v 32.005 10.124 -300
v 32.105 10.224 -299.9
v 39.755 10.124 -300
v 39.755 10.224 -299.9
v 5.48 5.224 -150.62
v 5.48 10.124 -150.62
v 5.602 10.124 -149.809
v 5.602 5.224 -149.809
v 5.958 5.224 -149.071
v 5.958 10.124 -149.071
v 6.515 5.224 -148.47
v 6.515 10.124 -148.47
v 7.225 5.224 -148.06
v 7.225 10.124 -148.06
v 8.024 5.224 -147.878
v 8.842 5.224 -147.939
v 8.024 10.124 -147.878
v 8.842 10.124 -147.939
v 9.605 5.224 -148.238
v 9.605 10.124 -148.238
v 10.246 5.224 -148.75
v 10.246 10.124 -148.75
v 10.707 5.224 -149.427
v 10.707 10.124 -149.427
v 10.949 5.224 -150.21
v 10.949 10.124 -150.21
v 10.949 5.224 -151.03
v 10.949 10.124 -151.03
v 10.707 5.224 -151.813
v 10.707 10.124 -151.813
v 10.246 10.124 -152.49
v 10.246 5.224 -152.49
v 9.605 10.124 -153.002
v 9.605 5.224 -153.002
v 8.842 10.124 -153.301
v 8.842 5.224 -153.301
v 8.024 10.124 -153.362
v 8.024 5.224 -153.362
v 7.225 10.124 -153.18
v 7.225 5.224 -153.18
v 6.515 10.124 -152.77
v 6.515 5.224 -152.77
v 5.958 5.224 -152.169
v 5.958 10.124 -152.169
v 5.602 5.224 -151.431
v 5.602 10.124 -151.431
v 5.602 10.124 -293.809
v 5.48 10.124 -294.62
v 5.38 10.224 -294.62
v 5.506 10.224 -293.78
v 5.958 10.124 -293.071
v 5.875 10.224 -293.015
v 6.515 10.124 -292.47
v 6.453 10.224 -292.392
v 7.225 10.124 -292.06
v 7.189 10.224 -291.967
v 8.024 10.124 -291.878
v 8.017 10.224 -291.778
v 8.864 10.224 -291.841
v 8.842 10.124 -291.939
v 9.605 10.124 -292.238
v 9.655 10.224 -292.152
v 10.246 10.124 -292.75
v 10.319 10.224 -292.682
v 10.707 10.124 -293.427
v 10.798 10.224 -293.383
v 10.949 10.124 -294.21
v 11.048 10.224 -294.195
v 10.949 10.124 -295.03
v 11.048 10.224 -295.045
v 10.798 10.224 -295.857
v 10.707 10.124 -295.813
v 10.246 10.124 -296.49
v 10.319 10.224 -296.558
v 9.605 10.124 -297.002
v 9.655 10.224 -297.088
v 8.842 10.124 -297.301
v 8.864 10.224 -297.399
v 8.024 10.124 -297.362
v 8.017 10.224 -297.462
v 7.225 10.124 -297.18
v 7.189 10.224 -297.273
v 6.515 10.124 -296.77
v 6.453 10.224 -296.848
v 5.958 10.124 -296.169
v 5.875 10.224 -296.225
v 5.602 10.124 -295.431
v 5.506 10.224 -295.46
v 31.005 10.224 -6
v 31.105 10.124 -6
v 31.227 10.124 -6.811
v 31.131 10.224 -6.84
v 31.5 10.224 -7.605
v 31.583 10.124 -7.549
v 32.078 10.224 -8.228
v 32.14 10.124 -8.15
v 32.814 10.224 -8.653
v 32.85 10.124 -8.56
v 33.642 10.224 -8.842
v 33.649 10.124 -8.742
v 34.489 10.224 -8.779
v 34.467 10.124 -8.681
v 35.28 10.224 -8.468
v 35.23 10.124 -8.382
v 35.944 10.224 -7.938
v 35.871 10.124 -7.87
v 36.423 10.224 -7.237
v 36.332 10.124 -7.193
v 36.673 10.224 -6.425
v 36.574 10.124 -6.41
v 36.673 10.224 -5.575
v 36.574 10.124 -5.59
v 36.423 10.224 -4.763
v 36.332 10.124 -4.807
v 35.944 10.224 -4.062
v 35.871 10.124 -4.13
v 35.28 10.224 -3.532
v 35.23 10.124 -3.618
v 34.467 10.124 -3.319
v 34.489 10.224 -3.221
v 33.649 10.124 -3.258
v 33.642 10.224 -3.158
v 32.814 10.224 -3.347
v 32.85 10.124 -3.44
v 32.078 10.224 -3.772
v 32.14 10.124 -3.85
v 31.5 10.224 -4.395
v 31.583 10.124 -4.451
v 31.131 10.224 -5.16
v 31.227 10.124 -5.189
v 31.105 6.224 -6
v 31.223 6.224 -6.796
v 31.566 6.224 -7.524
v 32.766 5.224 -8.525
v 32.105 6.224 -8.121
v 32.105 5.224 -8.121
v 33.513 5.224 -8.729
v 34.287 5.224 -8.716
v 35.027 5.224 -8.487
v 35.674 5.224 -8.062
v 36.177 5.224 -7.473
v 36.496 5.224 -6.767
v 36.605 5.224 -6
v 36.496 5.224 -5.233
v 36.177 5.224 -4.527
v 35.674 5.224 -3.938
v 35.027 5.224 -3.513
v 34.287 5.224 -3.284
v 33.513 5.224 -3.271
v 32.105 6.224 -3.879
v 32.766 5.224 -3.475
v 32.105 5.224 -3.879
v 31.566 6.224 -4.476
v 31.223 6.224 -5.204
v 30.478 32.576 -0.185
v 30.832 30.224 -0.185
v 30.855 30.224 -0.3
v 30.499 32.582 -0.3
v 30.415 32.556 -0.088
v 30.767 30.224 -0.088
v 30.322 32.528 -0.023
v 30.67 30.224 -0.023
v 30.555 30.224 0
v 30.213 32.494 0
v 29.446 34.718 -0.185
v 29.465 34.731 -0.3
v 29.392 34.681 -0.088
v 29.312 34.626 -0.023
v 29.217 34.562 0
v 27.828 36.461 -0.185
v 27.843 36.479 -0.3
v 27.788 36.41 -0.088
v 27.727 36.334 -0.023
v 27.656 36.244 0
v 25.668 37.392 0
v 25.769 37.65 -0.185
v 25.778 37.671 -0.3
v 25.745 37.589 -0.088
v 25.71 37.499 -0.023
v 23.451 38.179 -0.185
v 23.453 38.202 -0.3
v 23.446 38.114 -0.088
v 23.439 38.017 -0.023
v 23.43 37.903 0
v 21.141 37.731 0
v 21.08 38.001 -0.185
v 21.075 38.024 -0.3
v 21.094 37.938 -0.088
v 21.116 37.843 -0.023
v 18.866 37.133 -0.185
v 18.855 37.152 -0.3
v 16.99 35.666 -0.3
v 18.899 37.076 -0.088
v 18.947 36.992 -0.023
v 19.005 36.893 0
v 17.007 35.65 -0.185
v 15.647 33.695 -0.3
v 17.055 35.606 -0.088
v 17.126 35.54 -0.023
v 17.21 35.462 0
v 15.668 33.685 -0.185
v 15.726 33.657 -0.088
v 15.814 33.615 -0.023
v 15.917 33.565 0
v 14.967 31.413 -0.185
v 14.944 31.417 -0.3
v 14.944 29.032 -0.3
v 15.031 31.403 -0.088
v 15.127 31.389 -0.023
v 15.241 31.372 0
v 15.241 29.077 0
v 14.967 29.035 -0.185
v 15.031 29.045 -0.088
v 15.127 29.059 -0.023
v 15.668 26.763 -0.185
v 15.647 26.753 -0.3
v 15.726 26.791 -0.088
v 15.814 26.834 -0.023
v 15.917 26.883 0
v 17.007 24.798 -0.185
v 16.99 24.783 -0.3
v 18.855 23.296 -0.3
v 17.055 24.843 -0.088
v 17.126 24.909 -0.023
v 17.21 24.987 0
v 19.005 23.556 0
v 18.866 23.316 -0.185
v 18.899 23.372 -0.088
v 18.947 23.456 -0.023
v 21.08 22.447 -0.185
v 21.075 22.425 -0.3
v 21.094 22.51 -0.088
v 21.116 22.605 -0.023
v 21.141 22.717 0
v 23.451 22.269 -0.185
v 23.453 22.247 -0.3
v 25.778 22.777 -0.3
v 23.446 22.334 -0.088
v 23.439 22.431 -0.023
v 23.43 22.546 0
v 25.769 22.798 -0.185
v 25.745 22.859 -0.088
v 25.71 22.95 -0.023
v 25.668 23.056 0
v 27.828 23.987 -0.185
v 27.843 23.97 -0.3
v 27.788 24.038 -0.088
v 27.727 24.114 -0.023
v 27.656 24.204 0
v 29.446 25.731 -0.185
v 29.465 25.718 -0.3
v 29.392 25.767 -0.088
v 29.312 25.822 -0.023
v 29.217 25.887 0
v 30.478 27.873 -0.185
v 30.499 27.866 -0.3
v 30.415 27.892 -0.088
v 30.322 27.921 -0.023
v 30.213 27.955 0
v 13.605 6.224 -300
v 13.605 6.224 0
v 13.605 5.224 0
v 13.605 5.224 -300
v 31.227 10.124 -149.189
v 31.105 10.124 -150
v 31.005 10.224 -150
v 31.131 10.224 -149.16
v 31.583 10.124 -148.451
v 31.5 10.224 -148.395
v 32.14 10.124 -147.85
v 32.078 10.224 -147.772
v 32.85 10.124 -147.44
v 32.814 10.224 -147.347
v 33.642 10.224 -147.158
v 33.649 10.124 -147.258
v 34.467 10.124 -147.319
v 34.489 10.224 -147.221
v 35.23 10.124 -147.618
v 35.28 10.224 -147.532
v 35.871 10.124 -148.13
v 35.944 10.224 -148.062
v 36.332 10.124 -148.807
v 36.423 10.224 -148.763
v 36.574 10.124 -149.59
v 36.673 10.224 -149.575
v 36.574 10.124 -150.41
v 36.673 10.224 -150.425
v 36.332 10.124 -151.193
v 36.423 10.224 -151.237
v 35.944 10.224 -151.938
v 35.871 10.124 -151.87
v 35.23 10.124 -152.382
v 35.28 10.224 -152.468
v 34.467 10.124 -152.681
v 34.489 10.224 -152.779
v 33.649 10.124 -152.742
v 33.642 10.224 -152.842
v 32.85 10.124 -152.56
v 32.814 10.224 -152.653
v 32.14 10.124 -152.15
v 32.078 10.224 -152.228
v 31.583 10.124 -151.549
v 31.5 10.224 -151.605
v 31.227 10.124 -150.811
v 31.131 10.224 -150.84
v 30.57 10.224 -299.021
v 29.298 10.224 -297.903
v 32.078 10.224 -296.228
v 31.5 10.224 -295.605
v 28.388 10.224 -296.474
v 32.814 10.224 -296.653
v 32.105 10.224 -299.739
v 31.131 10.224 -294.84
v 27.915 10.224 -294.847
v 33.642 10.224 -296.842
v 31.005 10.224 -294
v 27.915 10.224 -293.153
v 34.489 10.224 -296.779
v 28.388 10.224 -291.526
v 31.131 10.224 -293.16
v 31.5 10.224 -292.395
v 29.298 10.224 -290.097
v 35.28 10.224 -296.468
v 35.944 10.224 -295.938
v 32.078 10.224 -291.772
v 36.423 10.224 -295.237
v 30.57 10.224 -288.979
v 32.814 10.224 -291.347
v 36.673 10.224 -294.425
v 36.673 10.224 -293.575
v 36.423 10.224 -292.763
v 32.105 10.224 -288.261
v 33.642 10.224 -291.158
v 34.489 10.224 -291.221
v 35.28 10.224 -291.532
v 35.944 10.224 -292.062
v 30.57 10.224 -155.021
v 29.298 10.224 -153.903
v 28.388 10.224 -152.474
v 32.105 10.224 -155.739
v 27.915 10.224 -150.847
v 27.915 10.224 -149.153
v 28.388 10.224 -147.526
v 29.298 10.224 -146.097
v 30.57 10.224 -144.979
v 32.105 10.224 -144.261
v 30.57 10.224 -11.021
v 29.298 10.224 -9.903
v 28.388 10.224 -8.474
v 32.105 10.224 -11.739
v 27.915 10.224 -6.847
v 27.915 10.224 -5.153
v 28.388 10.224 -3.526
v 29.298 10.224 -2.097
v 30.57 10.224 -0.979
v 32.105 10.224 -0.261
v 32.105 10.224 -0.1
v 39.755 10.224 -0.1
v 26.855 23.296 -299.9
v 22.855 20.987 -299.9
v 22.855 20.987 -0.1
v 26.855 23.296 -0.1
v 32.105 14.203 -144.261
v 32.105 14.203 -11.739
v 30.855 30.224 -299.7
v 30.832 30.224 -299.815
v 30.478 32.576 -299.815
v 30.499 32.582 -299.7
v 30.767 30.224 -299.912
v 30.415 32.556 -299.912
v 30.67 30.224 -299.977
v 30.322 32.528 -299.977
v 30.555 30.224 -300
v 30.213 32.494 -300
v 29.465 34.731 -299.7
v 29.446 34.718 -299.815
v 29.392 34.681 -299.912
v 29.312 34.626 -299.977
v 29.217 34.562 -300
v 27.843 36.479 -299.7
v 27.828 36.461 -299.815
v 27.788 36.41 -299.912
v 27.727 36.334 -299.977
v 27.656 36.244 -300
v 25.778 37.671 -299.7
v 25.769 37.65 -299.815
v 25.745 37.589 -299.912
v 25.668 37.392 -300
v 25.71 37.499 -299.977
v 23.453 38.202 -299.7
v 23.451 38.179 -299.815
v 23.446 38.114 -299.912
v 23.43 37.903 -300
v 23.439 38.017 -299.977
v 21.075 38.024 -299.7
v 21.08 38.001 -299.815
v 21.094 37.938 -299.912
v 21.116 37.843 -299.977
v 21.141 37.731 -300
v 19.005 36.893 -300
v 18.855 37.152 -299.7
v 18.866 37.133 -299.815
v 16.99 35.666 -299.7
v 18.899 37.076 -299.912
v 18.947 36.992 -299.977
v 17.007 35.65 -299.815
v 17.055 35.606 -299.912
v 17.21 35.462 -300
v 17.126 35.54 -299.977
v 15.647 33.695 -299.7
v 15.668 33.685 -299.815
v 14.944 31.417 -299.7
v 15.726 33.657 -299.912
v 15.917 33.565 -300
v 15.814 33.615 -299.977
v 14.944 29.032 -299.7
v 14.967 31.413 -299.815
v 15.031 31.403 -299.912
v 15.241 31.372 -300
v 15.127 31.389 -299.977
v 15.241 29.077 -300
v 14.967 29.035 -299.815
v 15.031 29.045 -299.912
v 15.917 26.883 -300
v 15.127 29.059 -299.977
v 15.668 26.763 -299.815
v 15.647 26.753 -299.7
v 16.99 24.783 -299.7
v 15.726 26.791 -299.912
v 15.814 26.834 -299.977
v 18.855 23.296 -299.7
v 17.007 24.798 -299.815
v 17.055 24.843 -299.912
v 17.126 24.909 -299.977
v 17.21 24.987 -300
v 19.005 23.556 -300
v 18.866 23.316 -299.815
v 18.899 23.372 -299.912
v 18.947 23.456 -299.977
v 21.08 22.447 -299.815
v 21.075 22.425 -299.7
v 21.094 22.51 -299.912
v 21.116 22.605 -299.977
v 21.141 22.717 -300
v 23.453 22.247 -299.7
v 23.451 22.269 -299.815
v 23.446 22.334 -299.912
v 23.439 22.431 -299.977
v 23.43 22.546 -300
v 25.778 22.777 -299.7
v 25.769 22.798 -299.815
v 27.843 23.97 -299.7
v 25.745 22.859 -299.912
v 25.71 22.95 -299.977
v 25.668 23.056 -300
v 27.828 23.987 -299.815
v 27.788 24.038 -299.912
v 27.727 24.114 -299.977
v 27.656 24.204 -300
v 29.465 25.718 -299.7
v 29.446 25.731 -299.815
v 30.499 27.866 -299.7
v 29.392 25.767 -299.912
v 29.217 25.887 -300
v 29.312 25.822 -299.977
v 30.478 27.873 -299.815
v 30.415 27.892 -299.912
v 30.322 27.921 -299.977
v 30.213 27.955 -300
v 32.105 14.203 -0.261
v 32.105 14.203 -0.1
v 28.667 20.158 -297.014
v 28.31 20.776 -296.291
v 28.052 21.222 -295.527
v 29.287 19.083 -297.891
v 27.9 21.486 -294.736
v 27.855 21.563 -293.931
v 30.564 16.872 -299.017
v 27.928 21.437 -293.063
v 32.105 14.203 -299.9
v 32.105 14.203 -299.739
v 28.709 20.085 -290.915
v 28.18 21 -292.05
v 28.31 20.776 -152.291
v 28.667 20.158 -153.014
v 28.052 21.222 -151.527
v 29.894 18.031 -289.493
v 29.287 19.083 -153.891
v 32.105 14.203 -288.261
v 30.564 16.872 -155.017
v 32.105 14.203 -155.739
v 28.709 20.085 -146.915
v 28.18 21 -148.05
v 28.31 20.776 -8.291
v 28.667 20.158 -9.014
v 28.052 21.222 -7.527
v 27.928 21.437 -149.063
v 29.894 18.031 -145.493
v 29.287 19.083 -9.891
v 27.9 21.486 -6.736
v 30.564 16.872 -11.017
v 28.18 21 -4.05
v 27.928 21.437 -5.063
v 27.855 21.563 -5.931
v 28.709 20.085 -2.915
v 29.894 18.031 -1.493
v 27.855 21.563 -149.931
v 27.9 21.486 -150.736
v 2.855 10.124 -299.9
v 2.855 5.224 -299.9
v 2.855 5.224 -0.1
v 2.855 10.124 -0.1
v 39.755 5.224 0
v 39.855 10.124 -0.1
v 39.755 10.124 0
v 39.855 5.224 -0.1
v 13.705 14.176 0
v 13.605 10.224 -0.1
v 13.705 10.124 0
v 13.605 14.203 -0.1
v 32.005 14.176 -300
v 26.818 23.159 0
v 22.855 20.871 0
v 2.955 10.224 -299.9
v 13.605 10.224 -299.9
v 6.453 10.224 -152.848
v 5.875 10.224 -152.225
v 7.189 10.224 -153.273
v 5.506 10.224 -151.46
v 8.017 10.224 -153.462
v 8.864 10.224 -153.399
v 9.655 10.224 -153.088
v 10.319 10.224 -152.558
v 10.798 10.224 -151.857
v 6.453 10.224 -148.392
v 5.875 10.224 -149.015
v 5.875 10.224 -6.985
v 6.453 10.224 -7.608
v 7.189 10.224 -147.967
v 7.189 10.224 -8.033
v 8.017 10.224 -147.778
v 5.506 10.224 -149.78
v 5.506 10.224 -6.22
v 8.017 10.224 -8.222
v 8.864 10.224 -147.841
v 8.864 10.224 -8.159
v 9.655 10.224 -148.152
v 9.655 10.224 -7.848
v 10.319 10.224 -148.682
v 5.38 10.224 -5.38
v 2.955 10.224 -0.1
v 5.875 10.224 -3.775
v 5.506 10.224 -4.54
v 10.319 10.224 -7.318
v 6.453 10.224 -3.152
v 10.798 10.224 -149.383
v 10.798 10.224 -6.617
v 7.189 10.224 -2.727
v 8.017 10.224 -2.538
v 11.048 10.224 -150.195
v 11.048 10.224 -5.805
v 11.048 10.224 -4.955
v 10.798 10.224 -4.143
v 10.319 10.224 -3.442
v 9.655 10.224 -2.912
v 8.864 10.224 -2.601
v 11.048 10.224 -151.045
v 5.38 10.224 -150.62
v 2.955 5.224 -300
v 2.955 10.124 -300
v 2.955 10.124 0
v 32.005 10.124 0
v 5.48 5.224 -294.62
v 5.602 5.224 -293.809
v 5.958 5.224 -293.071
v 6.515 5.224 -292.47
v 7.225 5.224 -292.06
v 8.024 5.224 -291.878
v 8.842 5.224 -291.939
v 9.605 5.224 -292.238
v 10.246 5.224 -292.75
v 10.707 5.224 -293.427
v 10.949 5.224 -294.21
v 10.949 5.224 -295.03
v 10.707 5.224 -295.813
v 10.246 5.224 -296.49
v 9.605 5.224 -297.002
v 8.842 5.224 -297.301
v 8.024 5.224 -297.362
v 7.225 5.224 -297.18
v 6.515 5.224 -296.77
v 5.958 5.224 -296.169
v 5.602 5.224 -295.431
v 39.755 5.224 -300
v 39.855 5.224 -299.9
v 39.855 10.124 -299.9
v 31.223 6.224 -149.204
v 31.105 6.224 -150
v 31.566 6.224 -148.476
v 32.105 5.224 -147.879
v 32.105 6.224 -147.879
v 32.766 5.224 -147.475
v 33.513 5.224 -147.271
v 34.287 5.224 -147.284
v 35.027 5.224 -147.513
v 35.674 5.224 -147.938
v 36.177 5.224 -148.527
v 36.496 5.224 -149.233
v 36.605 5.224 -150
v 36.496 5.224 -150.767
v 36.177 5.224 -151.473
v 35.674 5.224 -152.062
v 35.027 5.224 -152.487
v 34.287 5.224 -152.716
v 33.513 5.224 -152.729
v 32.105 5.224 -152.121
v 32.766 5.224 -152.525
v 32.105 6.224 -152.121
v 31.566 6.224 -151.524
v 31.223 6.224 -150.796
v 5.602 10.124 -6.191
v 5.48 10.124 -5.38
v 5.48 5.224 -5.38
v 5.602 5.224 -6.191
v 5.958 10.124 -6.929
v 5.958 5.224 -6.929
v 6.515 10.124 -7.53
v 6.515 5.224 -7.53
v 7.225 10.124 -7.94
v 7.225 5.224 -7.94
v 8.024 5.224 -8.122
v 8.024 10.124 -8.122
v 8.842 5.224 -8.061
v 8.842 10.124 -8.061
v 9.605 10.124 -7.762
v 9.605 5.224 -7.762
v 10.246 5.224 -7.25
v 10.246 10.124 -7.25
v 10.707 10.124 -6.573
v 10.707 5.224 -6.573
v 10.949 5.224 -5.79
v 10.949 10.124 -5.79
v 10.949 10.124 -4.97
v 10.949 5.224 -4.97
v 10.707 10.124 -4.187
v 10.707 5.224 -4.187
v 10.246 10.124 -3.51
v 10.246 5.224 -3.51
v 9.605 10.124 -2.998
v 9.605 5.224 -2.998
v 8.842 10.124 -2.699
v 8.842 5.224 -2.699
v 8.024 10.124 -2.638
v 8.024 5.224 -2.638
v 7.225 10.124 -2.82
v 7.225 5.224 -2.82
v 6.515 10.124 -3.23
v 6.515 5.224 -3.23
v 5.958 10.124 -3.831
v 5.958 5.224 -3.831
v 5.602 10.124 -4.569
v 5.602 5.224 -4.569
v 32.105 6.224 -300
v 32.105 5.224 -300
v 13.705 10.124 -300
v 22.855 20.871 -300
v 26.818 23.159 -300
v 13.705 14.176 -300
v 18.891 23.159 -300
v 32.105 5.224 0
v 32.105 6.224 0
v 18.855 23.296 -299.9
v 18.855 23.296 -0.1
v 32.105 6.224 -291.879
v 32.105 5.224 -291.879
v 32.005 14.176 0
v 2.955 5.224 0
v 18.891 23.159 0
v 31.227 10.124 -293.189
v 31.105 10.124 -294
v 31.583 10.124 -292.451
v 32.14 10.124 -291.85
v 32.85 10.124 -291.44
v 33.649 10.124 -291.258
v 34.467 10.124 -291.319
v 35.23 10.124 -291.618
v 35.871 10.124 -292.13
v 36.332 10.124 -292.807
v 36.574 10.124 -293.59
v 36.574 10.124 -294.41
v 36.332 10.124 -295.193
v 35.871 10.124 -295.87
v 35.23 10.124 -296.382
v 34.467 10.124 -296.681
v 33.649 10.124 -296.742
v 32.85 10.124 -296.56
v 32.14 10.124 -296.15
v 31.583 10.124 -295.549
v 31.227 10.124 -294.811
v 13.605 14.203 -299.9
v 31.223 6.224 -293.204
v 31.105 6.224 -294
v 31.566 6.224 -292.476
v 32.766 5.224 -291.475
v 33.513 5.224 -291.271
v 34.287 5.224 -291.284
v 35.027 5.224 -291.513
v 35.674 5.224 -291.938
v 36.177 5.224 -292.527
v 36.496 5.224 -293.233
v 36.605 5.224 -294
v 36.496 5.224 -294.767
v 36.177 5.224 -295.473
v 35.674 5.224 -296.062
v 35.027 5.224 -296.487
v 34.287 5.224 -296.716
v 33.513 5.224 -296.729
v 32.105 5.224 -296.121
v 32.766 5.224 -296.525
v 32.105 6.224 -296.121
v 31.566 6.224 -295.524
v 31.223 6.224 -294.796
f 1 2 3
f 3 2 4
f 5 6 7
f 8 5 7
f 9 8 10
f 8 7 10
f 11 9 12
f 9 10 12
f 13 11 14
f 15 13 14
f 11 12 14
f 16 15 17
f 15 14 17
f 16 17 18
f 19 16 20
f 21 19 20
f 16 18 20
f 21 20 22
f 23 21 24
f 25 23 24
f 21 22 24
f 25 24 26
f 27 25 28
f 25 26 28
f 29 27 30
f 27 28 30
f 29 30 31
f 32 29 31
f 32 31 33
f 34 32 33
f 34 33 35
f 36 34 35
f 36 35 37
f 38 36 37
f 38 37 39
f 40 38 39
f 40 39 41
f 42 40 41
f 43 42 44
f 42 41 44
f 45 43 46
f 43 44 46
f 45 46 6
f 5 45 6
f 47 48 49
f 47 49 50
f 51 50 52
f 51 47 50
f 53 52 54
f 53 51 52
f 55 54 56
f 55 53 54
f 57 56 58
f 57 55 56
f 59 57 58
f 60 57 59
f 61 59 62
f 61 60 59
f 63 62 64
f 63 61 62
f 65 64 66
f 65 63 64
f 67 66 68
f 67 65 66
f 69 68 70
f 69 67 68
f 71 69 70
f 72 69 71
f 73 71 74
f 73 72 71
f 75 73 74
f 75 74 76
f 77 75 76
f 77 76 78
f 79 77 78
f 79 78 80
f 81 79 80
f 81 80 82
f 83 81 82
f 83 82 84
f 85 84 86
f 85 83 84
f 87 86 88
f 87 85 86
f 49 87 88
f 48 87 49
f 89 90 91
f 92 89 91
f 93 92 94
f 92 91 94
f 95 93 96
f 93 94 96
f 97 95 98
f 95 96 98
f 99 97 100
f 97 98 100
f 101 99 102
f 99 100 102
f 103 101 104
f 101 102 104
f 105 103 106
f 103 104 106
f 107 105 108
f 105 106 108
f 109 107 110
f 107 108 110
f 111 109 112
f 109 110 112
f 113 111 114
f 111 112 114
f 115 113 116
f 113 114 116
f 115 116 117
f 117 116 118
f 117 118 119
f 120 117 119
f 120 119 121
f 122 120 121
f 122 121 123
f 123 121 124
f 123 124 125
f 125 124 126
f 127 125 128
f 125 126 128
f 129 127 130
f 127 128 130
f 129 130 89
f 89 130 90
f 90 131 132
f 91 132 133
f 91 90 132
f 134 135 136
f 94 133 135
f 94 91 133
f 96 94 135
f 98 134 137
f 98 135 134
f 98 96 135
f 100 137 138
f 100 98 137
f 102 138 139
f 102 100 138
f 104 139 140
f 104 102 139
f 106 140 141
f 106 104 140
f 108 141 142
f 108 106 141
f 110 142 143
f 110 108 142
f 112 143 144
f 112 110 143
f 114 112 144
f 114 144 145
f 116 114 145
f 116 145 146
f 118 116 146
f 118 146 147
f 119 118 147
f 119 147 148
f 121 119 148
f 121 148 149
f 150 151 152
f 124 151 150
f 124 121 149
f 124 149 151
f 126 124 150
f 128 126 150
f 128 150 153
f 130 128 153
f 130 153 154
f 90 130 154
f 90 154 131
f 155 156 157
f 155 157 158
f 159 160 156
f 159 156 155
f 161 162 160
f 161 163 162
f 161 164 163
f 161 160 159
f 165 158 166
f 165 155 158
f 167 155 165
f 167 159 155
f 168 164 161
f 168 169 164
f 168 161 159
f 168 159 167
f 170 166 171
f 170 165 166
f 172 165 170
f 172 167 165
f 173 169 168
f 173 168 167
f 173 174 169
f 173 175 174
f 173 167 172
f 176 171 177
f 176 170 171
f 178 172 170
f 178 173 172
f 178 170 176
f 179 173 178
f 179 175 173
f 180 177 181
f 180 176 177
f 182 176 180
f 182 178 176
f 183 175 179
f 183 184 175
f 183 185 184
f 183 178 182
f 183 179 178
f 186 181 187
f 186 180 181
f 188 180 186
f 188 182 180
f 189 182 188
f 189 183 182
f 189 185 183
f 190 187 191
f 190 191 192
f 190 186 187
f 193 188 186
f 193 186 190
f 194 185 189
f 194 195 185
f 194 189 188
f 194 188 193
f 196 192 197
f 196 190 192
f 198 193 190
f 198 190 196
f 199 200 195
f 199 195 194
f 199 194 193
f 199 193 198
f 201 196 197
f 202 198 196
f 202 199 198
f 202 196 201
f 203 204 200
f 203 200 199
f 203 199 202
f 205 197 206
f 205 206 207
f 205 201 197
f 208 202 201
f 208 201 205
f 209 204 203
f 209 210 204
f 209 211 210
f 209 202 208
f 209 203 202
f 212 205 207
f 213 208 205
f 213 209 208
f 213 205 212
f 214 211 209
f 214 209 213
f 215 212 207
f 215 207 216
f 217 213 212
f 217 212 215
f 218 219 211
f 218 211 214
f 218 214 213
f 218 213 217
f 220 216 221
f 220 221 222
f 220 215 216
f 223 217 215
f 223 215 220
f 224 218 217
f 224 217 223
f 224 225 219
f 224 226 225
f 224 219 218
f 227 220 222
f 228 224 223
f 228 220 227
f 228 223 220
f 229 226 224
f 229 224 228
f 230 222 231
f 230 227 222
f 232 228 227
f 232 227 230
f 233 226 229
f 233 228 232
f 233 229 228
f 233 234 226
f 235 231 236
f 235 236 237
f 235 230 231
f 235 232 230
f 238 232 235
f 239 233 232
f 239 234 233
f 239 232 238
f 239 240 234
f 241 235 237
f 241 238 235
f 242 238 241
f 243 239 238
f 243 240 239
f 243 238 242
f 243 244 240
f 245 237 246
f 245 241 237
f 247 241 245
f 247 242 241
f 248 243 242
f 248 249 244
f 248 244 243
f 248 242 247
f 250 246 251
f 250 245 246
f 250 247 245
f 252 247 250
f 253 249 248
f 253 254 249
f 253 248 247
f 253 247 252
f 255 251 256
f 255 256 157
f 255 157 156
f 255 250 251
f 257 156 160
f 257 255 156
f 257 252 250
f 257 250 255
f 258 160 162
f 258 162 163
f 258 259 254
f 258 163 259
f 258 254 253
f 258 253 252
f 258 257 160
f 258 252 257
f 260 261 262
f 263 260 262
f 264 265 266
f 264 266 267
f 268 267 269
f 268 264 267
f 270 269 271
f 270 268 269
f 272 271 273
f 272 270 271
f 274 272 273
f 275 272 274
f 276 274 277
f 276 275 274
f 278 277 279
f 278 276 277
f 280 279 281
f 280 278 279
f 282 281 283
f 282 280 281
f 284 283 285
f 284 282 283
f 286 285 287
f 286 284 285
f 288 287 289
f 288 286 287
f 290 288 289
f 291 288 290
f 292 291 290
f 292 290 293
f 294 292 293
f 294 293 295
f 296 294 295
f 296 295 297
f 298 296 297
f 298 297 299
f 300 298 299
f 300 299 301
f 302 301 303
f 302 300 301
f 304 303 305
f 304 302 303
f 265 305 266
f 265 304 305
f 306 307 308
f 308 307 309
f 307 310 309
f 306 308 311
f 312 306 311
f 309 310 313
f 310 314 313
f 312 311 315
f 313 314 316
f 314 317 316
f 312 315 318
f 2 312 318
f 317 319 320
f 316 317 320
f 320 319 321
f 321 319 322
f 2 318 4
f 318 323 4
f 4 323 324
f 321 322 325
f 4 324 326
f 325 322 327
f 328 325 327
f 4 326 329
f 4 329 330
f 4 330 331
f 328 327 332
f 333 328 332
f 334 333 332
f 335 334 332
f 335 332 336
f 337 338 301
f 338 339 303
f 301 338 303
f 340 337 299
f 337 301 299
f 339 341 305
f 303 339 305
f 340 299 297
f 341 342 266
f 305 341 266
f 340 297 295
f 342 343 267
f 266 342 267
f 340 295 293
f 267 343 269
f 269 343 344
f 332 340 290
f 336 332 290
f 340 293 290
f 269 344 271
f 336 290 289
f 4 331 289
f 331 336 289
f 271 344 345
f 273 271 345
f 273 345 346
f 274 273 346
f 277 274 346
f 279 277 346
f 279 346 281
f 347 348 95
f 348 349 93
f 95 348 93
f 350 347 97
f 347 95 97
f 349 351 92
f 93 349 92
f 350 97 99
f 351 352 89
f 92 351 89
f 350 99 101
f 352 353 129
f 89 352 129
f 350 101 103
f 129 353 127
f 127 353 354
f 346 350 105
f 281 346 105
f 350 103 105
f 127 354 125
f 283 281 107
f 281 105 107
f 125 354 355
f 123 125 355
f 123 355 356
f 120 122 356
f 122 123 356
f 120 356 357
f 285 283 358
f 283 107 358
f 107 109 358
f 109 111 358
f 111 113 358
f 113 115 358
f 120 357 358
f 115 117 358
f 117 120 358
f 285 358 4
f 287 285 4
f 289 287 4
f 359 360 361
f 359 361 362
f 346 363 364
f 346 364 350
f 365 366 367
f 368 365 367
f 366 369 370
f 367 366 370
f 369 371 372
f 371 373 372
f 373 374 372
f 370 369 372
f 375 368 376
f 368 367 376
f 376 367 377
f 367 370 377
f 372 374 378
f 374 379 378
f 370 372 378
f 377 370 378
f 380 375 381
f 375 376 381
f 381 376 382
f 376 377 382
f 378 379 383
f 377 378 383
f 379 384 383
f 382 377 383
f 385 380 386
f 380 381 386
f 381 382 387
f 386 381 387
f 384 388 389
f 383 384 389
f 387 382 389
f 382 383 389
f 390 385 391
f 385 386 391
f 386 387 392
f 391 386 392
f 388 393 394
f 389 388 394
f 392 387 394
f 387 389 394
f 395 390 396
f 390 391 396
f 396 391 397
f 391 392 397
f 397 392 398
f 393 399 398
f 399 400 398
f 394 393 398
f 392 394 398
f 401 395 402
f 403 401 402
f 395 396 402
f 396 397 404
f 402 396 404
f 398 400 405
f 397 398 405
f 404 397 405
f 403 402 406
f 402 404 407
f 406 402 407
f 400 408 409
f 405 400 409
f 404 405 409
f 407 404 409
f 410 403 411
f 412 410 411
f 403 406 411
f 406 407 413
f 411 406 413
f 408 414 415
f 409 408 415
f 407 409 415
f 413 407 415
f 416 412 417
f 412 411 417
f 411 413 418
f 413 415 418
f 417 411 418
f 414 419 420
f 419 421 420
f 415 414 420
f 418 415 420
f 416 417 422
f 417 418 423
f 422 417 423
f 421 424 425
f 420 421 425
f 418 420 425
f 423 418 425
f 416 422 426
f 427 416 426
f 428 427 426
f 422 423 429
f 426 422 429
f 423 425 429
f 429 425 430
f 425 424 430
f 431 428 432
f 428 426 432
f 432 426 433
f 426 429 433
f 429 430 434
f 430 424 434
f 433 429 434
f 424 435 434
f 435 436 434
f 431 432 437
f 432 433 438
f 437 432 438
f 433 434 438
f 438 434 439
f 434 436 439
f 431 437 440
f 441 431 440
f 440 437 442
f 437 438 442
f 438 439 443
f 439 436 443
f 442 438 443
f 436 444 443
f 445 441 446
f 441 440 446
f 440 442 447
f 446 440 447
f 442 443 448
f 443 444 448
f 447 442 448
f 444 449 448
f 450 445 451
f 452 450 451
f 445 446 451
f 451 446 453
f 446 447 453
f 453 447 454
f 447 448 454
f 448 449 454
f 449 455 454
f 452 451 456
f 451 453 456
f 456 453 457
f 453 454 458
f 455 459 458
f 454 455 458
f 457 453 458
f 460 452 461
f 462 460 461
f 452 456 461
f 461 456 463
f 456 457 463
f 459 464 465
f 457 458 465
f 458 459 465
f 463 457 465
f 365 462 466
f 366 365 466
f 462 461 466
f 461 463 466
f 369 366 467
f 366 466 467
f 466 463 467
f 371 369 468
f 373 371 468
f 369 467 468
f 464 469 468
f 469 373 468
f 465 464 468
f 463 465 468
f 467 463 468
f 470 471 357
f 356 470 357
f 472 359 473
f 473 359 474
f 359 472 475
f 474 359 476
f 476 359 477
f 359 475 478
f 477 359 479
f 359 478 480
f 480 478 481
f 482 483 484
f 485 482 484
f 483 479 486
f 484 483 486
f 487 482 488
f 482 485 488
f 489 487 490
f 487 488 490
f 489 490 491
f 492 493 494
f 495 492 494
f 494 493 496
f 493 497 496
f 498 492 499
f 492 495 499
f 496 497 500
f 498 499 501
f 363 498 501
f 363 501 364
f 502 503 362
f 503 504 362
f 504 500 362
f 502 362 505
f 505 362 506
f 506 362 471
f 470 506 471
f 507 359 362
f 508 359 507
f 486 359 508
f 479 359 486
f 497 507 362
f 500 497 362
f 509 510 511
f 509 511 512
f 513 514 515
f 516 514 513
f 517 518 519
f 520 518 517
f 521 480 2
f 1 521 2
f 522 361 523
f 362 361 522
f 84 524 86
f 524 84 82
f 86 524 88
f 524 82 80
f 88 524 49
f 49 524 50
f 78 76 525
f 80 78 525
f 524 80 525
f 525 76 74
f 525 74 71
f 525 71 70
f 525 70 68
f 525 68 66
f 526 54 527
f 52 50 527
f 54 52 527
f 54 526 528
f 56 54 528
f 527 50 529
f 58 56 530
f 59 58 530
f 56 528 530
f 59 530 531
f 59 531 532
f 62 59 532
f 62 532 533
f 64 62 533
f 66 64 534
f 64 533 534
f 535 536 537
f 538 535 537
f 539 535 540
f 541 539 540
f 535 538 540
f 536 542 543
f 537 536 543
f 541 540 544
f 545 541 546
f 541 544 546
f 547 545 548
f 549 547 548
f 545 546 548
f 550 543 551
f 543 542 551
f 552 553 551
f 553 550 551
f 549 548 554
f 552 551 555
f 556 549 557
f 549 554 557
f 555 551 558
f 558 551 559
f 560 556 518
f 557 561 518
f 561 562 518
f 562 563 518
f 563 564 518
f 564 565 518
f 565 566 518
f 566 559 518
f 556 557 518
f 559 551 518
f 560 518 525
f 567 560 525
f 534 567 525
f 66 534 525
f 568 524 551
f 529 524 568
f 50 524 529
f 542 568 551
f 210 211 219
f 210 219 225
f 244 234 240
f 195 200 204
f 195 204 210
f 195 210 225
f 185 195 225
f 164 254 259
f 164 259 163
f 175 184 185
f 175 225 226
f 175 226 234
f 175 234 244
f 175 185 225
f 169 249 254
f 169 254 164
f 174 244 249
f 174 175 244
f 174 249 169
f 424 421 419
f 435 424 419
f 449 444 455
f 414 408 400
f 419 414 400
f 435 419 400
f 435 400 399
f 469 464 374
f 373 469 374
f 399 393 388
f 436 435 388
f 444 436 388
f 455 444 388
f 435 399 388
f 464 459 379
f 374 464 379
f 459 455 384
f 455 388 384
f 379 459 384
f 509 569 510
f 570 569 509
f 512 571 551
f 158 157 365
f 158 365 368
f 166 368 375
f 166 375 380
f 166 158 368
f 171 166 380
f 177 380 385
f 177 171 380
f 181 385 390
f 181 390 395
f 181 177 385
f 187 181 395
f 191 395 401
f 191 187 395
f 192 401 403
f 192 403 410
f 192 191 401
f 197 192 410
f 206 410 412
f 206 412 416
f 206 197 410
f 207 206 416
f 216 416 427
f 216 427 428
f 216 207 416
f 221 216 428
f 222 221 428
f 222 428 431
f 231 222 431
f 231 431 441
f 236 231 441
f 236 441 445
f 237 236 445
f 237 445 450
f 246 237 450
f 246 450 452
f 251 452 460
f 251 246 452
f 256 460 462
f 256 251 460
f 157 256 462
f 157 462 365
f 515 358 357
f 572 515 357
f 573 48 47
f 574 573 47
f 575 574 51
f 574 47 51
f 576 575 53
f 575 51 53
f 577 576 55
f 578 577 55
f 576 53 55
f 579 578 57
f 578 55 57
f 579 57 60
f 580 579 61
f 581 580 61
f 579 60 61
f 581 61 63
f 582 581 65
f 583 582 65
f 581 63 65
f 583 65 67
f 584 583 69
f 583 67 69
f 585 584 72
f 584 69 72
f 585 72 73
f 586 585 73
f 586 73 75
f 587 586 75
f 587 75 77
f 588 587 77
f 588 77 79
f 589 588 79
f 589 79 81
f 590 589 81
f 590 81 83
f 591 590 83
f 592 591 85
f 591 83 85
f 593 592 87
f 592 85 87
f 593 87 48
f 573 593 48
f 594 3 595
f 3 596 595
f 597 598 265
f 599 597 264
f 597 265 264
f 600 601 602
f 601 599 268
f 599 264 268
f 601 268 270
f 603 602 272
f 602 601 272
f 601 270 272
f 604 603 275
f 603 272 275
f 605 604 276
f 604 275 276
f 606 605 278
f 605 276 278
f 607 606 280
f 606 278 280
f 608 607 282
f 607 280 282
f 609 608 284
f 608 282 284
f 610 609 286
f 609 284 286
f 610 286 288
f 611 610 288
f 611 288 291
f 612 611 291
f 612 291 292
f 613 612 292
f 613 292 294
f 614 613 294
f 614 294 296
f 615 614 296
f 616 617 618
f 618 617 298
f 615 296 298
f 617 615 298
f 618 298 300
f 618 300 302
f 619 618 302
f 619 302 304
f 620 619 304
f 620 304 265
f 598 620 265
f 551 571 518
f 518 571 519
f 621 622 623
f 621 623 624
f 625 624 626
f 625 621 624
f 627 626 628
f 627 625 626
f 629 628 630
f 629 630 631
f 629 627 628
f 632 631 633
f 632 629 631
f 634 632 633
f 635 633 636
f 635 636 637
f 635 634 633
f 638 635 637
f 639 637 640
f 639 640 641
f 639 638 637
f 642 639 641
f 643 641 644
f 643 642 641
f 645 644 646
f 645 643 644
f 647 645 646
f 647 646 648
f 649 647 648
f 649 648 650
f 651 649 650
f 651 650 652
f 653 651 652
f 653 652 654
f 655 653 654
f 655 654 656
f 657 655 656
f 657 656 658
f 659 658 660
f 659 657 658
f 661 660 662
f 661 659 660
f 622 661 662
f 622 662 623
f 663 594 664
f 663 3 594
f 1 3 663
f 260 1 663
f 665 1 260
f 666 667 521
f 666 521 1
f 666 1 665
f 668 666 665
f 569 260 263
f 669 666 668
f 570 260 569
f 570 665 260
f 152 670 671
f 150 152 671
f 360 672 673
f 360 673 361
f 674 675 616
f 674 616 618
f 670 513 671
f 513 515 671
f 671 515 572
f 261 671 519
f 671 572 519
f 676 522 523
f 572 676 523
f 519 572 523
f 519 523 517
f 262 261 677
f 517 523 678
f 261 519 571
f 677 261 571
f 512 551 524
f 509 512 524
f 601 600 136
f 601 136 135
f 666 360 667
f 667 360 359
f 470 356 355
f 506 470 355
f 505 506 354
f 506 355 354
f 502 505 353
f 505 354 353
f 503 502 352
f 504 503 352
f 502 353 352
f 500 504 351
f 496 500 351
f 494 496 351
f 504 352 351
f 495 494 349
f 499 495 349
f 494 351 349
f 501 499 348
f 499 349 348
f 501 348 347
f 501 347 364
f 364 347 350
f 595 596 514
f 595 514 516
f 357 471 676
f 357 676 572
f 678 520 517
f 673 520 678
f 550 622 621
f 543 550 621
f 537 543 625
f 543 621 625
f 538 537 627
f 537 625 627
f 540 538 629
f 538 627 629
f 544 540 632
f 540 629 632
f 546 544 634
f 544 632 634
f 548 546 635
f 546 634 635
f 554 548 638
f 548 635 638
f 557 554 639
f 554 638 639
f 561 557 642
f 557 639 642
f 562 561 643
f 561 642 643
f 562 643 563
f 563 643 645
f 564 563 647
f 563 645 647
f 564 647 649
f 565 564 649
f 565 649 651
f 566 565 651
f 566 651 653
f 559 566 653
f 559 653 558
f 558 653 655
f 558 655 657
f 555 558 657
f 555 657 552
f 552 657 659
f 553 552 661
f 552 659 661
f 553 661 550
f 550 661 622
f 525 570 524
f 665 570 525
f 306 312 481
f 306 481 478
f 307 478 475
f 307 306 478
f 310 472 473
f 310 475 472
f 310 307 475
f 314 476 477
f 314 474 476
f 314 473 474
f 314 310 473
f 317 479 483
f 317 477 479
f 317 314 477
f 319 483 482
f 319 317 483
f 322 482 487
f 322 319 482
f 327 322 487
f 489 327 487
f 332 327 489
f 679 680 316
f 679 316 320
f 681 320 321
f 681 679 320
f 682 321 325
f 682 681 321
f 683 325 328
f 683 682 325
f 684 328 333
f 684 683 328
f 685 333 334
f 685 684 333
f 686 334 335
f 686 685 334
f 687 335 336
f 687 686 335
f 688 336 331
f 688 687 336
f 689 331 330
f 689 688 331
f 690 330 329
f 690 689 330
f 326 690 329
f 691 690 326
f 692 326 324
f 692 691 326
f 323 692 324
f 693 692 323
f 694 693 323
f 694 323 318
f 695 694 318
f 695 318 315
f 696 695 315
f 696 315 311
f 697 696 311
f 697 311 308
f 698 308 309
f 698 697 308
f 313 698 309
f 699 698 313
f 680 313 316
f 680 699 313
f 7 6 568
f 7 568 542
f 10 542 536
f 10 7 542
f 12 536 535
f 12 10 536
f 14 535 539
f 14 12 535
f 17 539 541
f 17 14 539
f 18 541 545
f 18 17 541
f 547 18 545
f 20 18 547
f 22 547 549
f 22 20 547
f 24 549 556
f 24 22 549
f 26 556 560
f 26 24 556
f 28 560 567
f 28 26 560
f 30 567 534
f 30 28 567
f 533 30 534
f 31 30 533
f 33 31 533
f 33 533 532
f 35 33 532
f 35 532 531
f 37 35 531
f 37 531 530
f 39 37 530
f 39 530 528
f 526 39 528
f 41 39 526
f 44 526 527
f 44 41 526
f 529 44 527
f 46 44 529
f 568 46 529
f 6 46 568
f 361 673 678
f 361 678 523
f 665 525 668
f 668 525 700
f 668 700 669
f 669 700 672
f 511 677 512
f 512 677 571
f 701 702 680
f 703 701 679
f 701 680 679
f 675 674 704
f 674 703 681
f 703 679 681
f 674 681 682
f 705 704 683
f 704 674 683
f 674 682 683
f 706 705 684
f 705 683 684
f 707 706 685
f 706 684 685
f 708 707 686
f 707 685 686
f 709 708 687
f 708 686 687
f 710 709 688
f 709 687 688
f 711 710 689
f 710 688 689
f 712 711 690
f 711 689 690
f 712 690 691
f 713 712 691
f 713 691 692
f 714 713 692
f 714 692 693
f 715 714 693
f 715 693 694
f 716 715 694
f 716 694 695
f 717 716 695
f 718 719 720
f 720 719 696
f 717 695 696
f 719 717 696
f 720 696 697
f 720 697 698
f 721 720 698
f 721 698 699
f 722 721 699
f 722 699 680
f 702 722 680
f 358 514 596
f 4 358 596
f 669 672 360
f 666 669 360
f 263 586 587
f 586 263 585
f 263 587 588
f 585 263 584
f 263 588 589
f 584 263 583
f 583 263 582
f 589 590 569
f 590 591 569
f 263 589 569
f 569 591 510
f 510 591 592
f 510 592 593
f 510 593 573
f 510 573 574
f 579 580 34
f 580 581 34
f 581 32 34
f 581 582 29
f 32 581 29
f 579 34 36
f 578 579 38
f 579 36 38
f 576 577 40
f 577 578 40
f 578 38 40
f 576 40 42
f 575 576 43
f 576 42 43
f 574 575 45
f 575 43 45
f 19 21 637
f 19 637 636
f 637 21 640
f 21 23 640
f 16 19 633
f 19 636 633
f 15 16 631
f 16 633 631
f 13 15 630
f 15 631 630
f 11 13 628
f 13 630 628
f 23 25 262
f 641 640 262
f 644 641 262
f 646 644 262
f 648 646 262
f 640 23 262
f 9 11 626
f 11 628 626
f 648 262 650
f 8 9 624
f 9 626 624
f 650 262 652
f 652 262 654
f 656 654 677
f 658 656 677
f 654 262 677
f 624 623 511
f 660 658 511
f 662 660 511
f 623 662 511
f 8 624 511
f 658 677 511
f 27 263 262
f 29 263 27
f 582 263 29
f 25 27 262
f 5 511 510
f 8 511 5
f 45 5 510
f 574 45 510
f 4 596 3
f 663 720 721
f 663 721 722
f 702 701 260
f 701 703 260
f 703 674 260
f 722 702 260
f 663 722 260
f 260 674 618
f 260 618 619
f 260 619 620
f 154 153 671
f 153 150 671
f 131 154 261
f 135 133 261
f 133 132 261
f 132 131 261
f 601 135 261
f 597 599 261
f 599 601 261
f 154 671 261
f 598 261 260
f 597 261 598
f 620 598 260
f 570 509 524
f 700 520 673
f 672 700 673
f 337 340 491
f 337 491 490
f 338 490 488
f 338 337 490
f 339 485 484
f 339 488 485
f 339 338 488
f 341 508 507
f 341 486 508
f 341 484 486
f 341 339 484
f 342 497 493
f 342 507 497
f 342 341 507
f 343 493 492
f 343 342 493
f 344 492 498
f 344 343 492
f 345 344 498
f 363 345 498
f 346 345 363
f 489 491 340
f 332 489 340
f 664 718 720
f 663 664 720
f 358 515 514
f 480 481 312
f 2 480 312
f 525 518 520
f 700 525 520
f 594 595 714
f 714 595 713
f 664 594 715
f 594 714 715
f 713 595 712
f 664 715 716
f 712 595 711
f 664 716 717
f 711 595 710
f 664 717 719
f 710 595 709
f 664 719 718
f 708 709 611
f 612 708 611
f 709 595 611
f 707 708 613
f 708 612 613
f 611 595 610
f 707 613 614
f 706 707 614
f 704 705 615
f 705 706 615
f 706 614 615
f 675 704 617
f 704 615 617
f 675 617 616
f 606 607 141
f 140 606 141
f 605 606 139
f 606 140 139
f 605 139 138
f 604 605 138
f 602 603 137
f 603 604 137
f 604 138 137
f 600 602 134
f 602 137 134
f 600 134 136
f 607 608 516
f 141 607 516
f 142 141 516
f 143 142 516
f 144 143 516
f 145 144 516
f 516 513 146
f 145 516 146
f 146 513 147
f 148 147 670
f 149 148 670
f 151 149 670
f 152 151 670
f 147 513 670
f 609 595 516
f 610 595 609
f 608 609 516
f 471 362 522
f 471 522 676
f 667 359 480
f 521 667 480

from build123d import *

# Parameters (mm, degrees)
SKETCH1_R           = 8
BOSS_EXTRUDE1_DEPTH = 300
BOSS_EXTRUDE3_DEPTH = 300
FILLET1_R           = 0.3
SKETCH2_R           = 6
CUT_EXTRUDE1_DEPTH  = 12
SKETCH5_R           = 2.75
CUT_EXTRUDE2_DEPTH  = 5
SKETCH9_R           = 2.75
CUT_EXTRUDE3_DEPTH  = 5
LPATTERN1_COUNT     = 2
LPATTERN1_PITCH     = 144
LPATTERN2_COUNT     = 2
LPATTERN2_PITCH     = 144
CHAMFER1_SIZE       = 0.1


with BuildPart() as part:
    # Sketch1 → Boss-Extrude1 (new body)
    with BuildSketch(Plane.XY):
        with Locations((22.854793834, 30.224227114)):
            Circle(SKETCH1_R)
    extrude(amount=-BOSS_EXTRUDE1_DEPTH)

    # Fillet1
    fillet1_edges = [part.edges().sort_by_distance(p)[0] for p in [
        (14.854793834, 30.224227114, -300),
        (14.854793834, 30.224227114, 0),
    ]]
    fillet(fillet1_edges, radius=FILLET1_R)


with BuildPart() as body_2:
    # Sketch1<5> → Boss-Extrude3 (new body)
    with BuildSketch(Plane.XY):
        Polygon((2.854793834, 5.224227114), (2.854793834, 10.224227114), (13.604793834, 10.224227114), (13.604793834, 14.202757144), (18.854793834, 23.296023883), (22.854793834, 20.986622807), (26.854793834, 23.296023883), (32.104793834, 14.202757144), (32.104793834, 10.224227114), (39.854793834, 10.224227114), (39.854793834, 5.224227114), (32.104793834, 5.224227114), (32.104793834, 6.224227114), (13.604793834, 6.224227114), (13.604793834, 5.224227114), align=None)
    extrude(amount=-BOSS_EXTRUDE3_DEPTH)

    # Sketch2 → Cut-Extrude1 (cut)
    with BuildSketch(Plane(origin=(0, 10.224227114, 0), x_dir=(1, 0, 0), z_dir=(0, 1, 0))):
        with Locations((33.854793834, 294)):
            Circle(SKETCH2_R)
    cut_extrude1 = extrude(amount=CUT_EXTRUDE1_DEPTH, mode=Mode.SUBTRACT)

    # Sketch5 → Cut-Extrude2 (cut)
    with BuildSketch(Plane(origin=(0, 10.224227114, 0), x_dir=(1, 0, 0), z_dir=(0, 1, 0))):
        with Locations((33.854793834, 294)):
            Circle(SKETCH5_R)
    cut_extrude2 = extrude(amount=-CUT_EXTRUDE2_DEPTH, mode=Mode.SUBTRACT)

    # Mirror3: Cut-Extrude1, Cut-Extrude2 across plane
    add(cut_extrude1.mirror(Plane.XY.offset(-150)), mode=Mode.SUBTRACT)
    add(cut_extrude2.mirror(Plane.XY.offset(-150)), mode=Mode.SUBTRACT)

    # Sketch9 → Cut-Extrude3 (cut)
    with BuildSketch(Plane(origin=(0, 10.224227114, 0), x_dir=(1, 0, 0), z_dir=(0, 1, 0))):
        with Locations((8.229793834, 294.62)):
            Circle(SKETCH9_R)
    cut_extrude3 = extrude(amount=-CUT_EXTRUDE3_DEPTH, mode=Mode.SUBTRACT)

    # Mirror5: Cut-Extrude3 across plane
    add(cut_extrude3.mirror(Plane.XY.offset(-150)), mode=Mode.SUBTRACT)

    # LPattern1: Cut-Extrude1, Cut-Extrude2 ×2
    with Locations(*[(0, 0, i * LPATTERN1_PITCH) for i in range(1, LPATTERN1_COUNT)]):
        add(cut_extrude1, mode=Mode.SUBTRACT)
        add(cut_extrude2, mode=Mode.SUBTRACT)

    # LPattern2: Cut-Extrude3 ×2
    with Locations(*[(0, 0, i * LPATTERN2_PITCH) for i in range(1, LPATTERN2_COUNT)]):
        add(cut_extrude3, mode=Mode.SUBTRACT)

    # Chamfer1
    chamfer1_edges = [body_2.edges().sort_by_distance(p)[0] for p in [
        (2.854793834, 7.724227114, -300),
        (39.854793834, 7.724227114, -300),
        (35.979793834, 10.224227114, -300),
        (32.104793834, 12.213492129, -300),
        (29.479793834, 18.749390513, -300),
        (24.854793834, 22.141323345, -300),
        (20.854793834, 22.141323345, -300),
        (16.229793834, 18.749390513, -300),
        (13.604793834, 12.213492129, -300),
        (8.229793834, 10.224227114, -300),
        (2.854793834, 7.724227114, 0),
        (39.854793834, 7.724227114, 0),
        (39.854793834, 10.224227114, -150),
        (35.979793834, 10.224227114, 0),
        (32.104793834, 12.213492129, 0),
        (29.479793834, 18.749390513, 0),
        (24.854793834, 22.141323345, 0),
        (20.854793834, 22.141323345, 0),
        (16.229793834, 18.749390513, 0),
        (13.604793834, 12.213492129, 0),
        (8.229793834, 10.224227114, 0),
        (2.854793834, 10.224227114, -150),
        (31.104793834, 10.224227114, -6),
        (5.479793834, 10.224227114, -5.38),
        (31.104793834, 10.224227114, -150),
        (5.479793834, 10.224227114, -150.62),
        (31.104793834, 10.224227114, -294),
        (5.479793834, 10.224227114, -294.62),
    ]]
    chamfer(chamfer1_edges, length=CHAMFER1_SIZE)


solid = Compound([part.part, body_2.part])
